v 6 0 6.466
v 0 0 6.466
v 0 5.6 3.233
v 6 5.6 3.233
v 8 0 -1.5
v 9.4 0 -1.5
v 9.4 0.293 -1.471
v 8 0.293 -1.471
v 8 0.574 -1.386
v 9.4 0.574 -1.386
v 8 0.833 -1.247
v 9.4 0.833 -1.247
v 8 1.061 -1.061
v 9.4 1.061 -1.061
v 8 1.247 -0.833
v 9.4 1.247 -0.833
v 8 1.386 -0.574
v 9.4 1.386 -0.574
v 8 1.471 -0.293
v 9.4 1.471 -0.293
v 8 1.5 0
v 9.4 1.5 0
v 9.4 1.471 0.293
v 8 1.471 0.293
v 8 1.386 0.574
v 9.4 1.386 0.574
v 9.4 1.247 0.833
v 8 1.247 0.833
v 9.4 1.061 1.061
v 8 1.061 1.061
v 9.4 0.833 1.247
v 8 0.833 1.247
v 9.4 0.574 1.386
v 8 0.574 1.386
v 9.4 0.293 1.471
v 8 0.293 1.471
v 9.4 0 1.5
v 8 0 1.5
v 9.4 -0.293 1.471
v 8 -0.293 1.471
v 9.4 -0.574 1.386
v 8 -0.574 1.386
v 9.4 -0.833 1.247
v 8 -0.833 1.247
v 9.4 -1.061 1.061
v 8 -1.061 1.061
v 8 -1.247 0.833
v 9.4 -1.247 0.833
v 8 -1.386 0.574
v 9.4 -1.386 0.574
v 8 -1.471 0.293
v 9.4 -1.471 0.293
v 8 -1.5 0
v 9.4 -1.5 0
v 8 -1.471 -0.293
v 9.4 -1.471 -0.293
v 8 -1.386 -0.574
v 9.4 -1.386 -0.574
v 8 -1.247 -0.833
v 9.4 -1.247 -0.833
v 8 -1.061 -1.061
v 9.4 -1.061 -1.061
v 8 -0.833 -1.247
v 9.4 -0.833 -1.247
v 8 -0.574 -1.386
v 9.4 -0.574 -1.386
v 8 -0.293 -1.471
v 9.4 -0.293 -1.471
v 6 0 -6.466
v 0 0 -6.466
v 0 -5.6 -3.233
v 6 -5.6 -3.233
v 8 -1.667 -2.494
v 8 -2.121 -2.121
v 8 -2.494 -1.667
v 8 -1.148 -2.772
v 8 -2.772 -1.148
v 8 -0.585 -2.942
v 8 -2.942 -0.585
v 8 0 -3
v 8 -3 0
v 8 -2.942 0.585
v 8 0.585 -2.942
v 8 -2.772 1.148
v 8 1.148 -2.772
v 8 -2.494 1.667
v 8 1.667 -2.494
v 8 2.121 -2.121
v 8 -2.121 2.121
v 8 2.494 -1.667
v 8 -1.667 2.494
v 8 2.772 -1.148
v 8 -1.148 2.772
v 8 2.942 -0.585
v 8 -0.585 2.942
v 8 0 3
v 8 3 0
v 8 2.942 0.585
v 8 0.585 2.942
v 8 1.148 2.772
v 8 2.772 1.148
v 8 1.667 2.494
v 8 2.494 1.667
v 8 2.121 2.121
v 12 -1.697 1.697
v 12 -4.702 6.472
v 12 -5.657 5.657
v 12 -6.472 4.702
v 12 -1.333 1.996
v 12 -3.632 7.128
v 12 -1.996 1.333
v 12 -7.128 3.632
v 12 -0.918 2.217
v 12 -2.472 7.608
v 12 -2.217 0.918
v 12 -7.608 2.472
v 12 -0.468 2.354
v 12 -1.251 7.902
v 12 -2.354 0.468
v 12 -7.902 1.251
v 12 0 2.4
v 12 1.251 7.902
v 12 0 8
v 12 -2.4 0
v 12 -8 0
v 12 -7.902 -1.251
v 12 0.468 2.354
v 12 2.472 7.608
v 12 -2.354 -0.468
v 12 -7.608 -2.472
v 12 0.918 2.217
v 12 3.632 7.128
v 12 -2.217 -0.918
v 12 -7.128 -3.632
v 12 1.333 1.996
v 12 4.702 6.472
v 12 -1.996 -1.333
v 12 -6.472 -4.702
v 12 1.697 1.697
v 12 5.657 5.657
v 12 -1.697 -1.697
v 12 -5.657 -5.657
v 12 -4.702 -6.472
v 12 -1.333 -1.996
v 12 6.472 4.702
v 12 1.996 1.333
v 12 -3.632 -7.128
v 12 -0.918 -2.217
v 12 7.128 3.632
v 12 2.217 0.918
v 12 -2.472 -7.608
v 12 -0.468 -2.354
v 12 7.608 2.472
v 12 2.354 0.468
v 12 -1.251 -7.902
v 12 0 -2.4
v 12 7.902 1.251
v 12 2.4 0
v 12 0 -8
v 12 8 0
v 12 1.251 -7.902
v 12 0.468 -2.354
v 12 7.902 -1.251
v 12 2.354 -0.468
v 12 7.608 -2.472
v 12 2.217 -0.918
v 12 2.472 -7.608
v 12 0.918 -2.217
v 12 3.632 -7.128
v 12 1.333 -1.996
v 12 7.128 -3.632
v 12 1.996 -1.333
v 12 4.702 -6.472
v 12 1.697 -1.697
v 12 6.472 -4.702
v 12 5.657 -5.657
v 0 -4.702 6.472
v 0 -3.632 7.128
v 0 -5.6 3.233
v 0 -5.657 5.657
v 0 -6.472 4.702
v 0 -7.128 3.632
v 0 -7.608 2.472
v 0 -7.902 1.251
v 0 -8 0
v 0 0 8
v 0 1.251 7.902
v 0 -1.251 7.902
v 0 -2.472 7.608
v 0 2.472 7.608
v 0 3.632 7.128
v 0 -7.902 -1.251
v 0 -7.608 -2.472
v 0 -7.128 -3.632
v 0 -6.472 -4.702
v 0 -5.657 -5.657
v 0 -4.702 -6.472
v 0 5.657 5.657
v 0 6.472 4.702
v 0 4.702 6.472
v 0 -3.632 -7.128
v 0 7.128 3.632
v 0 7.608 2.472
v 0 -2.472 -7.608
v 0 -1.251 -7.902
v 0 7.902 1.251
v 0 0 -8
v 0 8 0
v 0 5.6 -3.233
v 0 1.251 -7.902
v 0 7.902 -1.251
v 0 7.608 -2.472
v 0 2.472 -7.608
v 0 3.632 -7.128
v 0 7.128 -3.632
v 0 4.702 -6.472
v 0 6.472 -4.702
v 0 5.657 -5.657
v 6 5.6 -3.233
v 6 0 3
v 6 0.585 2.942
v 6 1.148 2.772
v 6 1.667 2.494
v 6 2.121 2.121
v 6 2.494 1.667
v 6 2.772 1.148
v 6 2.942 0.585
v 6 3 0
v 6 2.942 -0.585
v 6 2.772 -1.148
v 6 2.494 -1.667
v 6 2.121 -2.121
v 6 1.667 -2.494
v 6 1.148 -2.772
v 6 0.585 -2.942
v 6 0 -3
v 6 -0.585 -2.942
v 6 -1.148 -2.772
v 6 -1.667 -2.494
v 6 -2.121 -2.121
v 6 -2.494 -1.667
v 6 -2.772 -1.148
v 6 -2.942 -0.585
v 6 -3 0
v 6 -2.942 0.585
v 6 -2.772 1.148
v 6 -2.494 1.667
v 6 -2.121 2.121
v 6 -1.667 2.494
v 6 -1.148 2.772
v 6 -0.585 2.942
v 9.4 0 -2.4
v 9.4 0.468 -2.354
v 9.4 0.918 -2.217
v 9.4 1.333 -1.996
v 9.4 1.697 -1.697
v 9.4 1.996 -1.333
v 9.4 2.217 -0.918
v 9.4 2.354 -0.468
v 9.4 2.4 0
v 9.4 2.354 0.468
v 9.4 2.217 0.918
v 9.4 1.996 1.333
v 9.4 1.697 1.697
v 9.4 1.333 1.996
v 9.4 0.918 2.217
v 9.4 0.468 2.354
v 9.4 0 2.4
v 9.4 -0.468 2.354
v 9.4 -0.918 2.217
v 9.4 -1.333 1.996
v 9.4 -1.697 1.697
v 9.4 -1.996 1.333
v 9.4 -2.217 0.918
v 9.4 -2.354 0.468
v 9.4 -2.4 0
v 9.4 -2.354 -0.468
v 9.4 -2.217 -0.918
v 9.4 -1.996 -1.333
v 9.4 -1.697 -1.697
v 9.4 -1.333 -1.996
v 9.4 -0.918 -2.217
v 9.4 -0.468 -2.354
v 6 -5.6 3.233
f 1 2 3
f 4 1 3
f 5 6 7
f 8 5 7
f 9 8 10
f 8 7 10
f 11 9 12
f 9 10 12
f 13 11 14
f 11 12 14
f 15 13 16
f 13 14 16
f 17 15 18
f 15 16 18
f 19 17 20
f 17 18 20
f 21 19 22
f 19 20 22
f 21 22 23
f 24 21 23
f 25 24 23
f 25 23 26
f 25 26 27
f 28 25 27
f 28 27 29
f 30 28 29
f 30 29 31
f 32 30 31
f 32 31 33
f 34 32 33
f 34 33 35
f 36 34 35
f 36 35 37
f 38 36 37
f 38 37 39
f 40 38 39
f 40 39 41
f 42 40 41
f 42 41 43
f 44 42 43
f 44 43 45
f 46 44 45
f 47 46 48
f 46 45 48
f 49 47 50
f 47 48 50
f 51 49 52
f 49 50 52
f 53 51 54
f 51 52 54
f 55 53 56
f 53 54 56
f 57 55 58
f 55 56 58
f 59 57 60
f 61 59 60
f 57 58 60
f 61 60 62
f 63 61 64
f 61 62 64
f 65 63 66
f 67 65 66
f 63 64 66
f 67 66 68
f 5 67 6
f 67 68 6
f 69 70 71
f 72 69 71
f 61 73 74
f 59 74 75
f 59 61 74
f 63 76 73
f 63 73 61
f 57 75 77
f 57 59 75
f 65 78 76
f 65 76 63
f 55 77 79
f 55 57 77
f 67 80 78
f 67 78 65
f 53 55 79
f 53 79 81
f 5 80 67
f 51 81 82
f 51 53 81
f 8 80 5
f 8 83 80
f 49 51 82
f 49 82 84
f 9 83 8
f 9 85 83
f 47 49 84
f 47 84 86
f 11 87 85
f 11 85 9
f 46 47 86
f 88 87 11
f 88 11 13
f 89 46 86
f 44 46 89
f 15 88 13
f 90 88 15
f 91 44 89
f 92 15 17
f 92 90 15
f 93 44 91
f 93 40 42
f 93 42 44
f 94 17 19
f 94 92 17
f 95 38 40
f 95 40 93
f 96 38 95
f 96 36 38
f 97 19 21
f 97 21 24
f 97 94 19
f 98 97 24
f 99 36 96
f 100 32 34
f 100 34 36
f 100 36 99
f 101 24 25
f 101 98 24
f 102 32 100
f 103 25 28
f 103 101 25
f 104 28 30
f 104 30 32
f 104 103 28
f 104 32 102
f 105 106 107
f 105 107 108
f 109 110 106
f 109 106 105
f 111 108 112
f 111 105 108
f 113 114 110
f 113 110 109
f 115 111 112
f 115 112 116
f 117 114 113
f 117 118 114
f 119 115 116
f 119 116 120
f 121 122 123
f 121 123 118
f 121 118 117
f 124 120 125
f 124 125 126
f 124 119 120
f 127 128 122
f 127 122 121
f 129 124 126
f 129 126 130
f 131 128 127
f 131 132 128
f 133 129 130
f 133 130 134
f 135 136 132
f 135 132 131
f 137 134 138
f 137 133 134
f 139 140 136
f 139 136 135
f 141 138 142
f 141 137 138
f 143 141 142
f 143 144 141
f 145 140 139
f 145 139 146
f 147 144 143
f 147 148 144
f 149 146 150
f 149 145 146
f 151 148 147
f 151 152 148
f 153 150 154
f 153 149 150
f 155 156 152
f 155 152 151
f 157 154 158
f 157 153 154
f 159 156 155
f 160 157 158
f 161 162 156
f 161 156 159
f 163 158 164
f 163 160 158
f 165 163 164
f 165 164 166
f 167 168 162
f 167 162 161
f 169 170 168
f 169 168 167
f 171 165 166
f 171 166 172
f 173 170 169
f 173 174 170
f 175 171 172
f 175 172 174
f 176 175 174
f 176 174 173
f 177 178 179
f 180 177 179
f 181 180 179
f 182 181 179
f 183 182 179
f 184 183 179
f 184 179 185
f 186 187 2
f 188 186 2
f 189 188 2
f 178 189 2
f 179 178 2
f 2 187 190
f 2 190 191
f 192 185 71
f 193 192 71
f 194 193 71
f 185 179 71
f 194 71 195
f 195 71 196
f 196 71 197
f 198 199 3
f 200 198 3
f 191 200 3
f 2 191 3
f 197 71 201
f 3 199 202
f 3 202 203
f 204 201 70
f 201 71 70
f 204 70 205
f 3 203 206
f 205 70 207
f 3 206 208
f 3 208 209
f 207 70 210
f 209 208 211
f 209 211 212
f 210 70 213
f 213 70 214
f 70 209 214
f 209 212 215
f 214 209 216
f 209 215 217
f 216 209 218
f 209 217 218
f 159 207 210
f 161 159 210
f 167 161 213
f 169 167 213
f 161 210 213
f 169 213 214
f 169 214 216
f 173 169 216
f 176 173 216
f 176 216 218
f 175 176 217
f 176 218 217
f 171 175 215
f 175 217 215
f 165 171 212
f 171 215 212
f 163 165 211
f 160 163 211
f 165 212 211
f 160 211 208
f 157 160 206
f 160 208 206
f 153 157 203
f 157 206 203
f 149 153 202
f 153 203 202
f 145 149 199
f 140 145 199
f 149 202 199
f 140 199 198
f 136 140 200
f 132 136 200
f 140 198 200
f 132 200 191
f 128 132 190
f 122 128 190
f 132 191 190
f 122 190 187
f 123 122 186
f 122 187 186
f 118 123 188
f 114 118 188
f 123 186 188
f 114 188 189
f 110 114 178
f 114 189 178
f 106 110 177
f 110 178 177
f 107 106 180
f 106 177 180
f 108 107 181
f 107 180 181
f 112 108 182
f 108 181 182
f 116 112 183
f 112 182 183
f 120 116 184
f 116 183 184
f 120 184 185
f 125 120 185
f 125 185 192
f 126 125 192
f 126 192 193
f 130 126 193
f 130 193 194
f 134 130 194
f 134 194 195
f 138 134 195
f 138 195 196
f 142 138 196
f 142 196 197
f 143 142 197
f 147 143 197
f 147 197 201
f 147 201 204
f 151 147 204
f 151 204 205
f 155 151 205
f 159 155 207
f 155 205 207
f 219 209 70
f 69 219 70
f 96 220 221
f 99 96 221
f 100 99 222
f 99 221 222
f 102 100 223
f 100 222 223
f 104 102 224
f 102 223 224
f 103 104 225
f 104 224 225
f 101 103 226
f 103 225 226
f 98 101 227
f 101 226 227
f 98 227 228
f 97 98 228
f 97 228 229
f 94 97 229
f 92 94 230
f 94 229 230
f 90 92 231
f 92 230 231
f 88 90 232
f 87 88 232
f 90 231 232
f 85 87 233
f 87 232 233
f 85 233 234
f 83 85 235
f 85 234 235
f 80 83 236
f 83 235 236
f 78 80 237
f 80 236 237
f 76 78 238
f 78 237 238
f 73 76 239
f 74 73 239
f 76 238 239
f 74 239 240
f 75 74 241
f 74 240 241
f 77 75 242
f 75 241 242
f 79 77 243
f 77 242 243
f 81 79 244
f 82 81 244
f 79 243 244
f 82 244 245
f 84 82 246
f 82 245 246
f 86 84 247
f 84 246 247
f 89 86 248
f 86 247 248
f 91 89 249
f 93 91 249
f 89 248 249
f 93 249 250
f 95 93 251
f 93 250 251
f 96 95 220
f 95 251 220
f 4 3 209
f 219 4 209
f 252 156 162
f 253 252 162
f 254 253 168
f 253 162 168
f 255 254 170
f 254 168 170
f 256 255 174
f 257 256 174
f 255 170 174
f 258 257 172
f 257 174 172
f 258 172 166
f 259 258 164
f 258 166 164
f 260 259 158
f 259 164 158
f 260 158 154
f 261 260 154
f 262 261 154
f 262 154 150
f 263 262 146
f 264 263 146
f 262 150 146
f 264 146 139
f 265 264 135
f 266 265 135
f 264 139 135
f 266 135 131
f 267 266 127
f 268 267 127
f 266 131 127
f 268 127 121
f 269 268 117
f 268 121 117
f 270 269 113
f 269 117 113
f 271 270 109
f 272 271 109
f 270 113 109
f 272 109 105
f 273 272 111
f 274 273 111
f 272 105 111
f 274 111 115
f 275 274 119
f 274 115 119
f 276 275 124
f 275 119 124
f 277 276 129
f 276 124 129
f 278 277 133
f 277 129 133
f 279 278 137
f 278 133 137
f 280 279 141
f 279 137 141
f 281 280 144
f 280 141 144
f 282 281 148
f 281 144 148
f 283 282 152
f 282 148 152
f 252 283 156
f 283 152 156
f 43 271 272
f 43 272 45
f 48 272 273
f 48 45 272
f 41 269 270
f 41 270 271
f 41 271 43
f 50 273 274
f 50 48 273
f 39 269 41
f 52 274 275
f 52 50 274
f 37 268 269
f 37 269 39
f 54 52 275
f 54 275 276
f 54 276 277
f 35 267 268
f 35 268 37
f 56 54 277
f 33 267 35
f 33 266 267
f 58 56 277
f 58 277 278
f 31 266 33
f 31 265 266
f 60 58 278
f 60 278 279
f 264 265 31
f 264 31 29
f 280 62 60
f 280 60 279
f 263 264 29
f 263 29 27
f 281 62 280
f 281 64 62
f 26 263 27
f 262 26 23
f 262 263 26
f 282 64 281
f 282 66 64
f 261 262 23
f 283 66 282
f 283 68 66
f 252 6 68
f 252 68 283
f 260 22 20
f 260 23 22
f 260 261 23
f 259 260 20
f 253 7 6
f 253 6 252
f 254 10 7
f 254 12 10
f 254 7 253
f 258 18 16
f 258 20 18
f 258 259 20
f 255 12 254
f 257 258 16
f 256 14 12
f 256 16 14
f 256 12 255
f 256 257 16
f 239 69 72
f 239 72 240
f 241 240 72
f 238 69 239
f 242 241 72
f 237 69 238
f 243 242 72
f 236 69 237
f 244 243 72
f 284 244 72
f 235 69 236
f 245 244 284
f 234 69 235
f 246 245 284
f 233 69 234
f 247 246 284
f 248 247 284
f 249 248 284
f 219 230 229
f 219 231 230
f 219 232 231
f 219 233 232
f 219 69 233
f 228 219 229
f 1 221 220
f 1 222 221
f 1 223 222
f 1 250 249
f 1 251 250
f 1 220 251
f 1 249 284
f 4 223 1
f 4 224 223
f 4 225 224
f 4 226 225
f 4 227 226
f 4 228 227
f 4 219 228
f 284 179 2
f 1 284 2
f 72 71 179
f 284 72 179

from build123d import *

# Parameters (mm, degrees)
SKETCH1_R           = 8
BOSS_EXTRUDE1_DEPTH = 12
CUT_EXTRUDE1_DEPTH  = 6
SKETCH3_R           = 2.4
CUT_EXTRUDE2_DEPTH  = 2.6
SKETCH4_R           = 1.5
CUT_EXTRUDE3_DEPTH  = 10.4
SKETCH5_R           = 3
CUT_EXTRUDE4_DEPTH  = 2


with BuildPart() as part:
    # Sketch1 → Boss-Extrude1 (new body)
    with BuildSketch(Plane(origin=(0, 0, 0), x_dir=(0, 0, -1), z_dir=(1, 0, 0))):
        Circle(SKETCH1_R)
    extrude(amount=BOSS_EXTRUDE1_DEPTH)

    # Sketch2 → Cut-Extrude1 (cut)
    with BuildSketch(Plane.ZY):
        Polygon((6.466323015, 0), (3.233161507, 5.6), (-3.233161507, 5.6), (-6.466323015, 0), (-3.233161507, -5.6), (3.233161507, -5.6), align=None)
    extrude(amount=-CUT_EXTRUDE1_DEPTH, mode=Mode.SUBTRACT)

    # Sketch3 → Cut-Extrude2 (cut)
    with BuildSketch(Plane(origin=(12, 0, 0), x_dir=(0, 0, -1), z_dir=(1, 0, 0))):
        Circle(SKETCH3_R)
    extrude(amount=-CUT_EXTRUDE2_DEPTH, mode=Mode.SUBTRACT)

    # Sketch4 → Cut-Extrude3 (cut, through all)
    with BuildSketch(Plane(origin=(9.4, 0, 0), x_dir=(0, 0, -1), z_dir=(1, 0, 0))):
        Circle(SKETCH4_R)
    extrude(amount=-CUT_EXTRUDE3_DEPTH, mode=Mode.SUBTRACT)

    # Sketch5 → Cut-Extrude4 (cut)
    with BuildSketch(Plane.ZY.offset(-6)):
        Circle(SKETCH5_R)
    extrude(amount=-CUT_EXTRUDE4_DEPTH, mode=Mode.SUBTRACT)


solid = part.part
